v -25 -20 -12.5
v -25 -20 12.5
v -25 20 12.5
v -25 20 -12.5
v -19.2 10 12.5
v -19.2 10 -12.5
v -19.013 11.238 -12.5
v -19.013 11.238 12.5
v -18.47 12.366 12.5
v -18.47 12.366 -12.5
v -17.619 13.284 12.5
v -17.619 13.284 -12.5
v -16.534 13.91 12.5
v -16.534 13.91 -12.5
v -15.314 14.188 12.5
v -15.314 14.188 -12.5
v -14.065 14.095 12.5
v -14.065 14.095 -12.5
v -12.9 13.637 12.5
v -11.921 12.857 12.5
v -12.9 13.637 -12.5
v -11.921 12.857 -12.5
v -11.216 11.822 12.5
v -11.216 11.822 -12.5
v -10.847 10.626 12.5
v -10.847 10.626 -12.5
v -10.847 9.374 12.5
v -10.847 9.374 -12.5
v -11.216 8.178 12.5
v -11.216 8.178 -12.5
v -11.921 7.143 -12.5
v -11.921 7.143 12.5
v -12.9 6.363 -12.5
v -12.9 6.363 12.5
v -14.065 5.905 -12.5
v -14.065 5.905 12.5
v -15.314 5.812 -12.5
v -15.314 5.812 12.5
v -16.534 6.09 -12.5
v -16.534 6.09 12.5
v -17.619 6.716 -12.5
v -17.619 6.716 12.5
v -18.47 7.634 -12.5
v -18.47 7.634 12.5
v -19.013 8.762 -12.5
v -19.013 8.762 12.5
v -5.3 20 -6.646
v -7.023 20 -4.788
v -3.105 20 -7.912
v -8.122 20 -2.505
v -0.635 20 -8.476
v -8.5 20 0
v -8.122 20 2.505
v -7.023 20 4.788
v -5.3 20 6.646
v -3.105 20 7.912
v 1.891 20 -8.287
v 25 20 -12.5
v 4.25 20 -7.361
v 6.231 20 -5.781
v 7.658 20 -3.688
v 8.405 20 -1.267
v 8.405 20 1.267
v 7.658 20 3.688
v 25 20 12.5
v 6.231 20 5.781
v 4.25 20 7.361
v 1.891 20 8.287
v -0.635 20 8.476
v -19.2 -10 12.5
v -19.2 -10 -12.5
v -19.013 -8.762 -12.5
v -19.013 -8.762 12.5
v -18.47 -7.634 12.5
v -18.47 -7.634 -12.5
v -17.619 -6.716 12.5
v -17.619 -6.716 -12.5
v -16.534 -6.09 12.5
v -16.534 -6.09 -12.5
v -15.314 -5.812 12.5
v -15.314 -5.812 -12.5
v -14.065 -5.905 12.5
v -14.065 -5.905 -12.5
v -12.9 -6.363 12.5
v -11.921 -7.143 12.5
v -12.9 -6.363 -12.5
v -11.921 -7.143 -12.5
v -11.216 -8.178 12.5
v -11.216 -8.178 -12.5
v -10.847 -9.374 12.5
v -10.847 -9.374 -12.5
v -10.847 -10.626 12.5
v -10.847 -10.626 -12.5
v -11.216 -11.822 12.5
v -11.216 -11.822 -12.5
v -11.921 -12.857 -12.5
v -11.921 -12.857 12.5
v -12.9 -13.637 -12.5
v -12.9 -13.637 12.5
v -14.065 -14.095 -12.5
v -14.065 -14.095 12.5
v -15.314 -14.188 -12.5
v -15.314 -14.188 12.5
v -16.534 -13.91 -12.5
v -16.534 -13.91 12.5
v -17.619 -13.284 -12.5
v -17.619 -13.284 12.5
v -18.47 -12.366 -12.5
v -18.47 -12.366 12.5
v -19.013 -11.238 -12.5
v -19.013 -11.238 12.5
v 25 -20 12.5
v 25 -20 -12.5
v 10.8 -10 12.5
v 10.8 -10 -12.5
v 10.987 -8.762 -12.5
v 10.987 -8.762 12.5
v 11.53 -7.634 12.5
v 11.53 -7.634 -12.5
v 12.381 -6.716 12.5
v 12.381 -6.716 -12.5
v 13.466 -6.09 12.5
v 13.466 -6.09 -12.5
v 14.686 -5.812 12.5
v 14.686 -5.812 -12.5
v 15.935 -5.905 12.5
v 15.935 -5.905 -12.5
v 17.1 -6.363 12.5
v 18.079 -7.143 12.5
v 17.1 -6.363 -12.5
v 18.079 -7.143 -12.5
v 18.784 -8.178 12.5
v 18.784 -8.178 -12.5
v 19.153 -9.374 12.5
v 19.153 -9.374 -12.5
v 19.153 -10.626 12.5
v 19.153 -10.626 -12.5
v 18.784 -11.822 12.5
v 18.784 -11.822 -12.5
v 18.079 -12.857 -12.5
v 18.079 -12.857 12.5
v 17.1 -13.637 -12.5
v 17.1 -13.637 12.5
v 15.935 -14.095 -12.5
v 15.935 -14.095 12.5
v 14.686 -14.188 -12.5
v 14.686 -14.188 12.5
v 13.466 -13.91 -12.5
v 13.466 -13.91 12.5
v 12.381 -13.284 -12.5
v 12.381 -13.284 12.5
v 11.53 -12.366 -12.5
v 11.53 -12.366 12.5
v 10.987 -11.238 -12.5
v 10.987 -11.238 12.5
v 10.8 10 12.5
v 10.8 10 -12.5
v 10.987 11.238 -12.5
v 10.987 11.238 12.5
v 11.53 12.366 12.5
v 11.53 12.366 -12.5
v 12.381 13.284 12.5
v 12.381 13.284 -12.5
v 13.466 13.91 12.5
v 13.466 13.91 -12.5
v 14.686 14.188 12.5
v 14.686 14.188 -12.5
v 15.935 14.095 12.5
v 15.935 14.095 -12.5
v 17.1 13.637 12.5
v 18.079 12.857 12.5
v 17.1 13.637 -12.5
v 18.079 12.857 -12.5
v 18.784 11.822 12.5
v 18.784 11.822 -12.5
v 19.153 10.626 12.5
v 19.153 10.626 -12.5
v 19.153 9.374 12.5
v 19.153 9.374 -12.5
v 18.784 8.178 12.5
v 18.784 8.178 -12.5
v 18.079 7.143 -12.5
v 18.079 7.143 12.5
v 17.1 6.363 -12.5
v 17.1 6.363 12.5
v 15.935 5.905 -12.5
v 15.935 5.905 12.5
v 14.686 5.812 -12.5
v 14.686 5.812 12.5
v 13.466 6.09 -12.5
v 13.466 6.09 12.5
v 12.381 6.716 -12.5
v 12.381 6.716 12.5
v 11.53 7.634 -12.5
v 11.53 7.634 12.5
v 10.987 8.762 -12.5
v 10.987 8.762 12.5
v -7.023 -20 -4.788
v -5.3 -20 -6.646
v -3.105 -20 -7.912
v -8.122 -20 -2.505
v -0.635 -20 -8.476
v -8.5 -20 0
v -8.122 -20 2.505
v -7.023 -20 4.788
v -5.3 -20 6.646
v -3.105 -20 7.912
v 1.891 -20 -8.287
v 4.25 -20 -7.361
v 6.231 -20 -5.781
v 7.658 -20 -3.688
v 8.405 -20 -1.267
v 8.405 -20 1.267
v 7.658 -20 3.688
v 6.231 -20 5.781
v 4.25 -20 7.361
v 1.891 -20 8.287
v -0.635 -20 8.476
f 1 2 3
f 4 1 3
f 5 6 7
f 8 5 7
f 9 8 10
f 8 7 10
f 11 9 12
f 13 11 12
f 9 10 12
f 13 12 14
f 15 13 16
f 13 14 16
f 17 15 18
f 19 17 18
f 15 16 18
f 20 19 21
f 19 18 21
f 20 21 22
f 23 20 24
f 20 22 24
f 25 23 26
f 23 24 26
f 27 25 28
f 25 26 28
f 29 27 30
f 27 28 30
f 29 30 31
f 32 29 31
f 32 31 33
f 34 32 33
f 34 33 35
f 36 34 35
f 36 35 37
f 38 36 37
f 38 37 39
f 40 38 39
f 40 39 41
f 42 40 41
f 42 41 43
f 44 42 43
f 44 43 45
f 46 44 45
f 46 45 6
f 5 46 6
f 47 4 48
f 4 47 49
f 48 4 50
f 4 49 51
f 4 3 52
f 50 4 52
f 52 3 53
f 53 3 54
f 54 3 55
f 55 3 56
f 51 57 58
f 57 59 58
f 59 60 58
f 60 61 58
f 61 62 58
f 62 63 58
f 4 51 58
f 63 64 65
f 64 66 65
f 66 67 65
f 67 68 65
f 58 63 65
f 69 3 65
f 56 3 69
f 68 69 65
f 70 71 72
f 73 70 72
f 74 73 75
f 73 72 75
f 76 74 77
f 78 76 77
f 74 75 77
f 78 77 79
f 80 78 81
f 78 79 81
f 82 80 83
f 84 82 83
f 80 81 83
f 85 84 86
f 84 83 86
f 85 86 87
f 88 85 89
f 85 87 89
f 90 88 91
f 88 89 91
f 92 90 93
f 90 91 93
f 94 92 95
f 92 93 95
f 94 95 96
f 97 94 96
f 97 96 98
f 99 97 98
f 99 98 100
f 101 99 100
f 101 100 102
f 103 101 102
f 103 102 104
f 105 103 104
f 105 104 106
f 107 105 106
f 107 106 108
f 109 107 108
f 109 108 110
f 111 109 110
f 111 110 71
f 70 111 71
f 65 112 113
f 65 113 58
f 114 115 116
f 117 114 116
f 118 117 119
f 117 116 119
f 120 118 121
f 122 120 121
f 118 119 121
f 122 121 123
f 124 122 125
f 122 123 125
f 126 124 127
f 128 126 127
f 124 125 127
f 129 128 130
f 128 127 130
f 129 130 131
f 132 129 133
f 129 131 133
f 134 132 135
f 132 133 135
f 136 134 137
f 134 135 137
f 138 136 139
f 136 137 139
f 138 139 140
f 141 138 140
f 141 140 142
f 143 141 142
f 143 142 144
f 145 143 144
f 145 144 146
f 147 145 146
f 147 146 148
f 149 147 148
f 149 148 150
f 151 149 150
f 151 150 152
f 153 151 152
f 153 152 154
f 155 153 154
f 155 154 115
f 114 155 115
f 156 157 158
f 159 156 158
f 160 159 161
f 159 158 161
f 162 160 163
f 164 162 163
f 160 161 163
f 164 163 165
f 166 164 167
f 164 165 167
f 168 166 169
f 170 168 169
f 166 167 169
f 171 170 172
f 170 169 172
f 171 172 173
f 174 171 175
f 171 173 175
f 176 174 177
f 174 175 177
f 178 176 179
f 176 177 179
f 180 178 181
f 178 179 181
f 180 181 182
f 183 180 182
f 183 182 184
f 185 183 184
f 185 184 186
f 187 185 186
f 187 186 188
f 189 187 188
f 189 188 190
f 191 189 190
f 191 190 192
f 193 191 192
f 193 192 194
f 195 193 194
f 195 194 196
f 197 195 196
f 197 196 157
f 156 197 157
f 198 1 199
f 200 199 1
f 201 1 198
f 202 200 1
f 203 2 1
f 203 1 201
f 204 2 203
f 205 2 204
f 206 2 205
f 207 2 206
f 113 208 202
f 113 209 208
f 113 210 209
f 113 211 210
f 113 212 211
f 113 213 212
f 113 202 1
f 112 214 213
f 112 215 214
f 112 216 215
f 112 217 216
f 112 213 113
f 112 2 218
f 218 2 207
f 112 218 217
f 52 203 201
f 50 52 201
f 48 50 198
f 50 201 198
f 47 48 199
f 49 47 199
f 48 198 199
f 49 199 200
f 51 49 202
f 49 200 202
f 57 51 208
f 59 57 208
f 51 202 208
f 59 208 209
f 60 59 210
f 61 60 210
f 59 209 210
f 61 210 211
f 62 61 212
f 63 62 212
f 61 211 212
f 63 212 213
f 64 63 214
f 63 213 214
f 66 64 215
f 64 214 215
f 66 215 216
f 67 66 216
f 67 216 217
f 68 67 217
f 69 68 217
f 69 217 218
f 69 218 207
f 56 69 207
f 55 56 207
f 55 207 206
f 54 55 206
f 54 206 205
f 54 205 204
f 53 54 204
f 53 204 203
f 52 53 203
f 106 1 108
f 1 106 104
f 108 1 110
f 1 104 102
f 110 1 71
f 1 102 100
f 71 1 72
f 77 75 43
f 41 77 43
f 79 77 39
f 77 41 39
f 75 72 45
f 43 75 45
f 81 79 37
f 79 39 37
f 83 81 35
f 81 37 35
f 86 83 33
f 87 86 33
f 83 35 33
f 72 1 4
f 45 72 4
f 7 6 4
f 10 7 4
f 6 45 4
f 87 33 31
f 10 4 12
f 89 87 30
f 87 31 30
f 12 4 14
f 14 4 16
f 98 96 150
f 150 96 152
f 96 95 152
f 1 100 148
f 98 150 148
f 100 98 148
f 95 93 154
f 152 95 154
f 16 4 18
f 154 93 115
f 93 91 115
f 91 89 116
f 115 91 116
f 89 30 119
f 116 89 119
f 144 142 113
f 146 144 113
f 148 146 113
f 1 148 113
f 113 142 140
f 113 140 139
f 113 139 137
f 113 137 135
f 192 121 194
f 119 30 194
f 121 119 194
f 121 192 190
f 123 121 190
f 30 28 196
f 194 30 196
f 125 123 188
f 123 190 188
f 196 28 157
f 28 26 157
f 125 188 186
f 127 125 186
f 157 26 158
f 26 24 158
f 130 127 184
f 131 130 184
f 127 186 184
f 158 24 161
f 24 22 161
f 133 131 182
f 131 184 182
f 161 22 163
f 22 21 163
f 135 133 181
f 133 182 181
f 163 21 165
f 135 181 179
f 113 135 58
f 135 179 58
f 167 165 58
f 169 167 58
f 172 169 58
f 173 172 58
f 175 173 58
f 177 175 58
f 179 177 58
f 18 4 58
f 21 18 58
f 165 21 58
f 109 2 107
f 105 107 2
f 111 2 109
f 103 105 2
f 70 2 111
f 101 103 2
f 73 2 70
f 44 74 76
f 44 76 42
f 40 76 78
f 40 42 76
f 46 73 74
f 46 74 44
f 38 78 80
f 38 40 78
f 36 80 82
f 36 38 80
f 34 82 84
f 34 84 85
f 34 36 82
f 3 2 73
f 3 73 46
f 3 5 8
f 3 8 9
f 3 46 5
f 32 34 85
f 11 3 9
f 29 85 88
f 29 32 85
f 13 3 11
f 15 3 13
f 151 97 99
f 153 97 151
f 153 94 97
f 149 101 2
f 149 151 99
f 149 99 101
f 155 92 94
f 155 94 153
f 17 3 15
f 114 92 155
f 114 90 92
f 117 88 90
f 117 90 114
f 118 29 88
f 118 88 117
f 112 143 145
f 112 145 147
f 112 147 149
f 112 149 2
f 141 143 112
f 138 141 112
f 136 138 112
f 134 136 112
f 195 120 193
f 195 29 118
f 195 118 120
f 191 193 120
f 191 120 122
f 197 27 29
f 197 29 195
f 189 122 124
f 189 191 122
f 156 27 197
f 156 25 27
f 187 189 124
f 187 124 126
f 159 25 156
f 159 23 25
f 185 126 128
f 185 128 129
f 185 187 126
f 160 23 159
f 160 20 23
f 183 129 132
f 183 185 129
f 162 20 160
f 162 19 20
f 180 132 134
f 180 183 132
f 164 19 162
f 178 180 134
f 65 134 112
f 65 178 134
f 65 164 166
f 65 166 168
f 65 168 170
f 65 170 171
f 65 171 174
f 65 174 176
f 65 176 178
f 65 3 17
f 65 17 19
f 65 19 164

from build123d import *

# Parameters (mm, degrees)
CROQUIS1_W                    = 50
CROQUIS1_H                    = 40
SALIENTE_EXTRUIR1_DEPTH       = 12.5
TALADRO_DE_MARGEN_PARA_M81_D  = 8.4
TALADRO_DE_MARGEN_PARA_M161_D = 17


with BuildPart() as part:
    # Croquis1 → Saliente-Extruir1 (new body, symmetric)
    with BuildSketch(Plane.XY):
        Rectangle(CROQUIS1_W, CROQUIS1_H)
    extrude(amount=SALIENTE_EXTRUIR1_DEPTH, both=True)

    # Taladro de margen para M81 (through all)
    with Locations(Plane.XY.offset(12.5)):
        with Locations((-15, 10), (-15, -10), (15, -10), (15, 10)):
            Hole(TALADRO_DE_MARGEN_PARA_M81_D / 2)

    # Taladro de margen para M161 (through all)
    with Locations(Plane(origin=(0, 20, 0), x_dir=(1, 0, 0), z_dir=(0, 1, 0))):
        with Locations((0, 0)):
            Hole(TALADRO_DE_MARGEN_PARA_M161_D / 2)


solid = part.part
